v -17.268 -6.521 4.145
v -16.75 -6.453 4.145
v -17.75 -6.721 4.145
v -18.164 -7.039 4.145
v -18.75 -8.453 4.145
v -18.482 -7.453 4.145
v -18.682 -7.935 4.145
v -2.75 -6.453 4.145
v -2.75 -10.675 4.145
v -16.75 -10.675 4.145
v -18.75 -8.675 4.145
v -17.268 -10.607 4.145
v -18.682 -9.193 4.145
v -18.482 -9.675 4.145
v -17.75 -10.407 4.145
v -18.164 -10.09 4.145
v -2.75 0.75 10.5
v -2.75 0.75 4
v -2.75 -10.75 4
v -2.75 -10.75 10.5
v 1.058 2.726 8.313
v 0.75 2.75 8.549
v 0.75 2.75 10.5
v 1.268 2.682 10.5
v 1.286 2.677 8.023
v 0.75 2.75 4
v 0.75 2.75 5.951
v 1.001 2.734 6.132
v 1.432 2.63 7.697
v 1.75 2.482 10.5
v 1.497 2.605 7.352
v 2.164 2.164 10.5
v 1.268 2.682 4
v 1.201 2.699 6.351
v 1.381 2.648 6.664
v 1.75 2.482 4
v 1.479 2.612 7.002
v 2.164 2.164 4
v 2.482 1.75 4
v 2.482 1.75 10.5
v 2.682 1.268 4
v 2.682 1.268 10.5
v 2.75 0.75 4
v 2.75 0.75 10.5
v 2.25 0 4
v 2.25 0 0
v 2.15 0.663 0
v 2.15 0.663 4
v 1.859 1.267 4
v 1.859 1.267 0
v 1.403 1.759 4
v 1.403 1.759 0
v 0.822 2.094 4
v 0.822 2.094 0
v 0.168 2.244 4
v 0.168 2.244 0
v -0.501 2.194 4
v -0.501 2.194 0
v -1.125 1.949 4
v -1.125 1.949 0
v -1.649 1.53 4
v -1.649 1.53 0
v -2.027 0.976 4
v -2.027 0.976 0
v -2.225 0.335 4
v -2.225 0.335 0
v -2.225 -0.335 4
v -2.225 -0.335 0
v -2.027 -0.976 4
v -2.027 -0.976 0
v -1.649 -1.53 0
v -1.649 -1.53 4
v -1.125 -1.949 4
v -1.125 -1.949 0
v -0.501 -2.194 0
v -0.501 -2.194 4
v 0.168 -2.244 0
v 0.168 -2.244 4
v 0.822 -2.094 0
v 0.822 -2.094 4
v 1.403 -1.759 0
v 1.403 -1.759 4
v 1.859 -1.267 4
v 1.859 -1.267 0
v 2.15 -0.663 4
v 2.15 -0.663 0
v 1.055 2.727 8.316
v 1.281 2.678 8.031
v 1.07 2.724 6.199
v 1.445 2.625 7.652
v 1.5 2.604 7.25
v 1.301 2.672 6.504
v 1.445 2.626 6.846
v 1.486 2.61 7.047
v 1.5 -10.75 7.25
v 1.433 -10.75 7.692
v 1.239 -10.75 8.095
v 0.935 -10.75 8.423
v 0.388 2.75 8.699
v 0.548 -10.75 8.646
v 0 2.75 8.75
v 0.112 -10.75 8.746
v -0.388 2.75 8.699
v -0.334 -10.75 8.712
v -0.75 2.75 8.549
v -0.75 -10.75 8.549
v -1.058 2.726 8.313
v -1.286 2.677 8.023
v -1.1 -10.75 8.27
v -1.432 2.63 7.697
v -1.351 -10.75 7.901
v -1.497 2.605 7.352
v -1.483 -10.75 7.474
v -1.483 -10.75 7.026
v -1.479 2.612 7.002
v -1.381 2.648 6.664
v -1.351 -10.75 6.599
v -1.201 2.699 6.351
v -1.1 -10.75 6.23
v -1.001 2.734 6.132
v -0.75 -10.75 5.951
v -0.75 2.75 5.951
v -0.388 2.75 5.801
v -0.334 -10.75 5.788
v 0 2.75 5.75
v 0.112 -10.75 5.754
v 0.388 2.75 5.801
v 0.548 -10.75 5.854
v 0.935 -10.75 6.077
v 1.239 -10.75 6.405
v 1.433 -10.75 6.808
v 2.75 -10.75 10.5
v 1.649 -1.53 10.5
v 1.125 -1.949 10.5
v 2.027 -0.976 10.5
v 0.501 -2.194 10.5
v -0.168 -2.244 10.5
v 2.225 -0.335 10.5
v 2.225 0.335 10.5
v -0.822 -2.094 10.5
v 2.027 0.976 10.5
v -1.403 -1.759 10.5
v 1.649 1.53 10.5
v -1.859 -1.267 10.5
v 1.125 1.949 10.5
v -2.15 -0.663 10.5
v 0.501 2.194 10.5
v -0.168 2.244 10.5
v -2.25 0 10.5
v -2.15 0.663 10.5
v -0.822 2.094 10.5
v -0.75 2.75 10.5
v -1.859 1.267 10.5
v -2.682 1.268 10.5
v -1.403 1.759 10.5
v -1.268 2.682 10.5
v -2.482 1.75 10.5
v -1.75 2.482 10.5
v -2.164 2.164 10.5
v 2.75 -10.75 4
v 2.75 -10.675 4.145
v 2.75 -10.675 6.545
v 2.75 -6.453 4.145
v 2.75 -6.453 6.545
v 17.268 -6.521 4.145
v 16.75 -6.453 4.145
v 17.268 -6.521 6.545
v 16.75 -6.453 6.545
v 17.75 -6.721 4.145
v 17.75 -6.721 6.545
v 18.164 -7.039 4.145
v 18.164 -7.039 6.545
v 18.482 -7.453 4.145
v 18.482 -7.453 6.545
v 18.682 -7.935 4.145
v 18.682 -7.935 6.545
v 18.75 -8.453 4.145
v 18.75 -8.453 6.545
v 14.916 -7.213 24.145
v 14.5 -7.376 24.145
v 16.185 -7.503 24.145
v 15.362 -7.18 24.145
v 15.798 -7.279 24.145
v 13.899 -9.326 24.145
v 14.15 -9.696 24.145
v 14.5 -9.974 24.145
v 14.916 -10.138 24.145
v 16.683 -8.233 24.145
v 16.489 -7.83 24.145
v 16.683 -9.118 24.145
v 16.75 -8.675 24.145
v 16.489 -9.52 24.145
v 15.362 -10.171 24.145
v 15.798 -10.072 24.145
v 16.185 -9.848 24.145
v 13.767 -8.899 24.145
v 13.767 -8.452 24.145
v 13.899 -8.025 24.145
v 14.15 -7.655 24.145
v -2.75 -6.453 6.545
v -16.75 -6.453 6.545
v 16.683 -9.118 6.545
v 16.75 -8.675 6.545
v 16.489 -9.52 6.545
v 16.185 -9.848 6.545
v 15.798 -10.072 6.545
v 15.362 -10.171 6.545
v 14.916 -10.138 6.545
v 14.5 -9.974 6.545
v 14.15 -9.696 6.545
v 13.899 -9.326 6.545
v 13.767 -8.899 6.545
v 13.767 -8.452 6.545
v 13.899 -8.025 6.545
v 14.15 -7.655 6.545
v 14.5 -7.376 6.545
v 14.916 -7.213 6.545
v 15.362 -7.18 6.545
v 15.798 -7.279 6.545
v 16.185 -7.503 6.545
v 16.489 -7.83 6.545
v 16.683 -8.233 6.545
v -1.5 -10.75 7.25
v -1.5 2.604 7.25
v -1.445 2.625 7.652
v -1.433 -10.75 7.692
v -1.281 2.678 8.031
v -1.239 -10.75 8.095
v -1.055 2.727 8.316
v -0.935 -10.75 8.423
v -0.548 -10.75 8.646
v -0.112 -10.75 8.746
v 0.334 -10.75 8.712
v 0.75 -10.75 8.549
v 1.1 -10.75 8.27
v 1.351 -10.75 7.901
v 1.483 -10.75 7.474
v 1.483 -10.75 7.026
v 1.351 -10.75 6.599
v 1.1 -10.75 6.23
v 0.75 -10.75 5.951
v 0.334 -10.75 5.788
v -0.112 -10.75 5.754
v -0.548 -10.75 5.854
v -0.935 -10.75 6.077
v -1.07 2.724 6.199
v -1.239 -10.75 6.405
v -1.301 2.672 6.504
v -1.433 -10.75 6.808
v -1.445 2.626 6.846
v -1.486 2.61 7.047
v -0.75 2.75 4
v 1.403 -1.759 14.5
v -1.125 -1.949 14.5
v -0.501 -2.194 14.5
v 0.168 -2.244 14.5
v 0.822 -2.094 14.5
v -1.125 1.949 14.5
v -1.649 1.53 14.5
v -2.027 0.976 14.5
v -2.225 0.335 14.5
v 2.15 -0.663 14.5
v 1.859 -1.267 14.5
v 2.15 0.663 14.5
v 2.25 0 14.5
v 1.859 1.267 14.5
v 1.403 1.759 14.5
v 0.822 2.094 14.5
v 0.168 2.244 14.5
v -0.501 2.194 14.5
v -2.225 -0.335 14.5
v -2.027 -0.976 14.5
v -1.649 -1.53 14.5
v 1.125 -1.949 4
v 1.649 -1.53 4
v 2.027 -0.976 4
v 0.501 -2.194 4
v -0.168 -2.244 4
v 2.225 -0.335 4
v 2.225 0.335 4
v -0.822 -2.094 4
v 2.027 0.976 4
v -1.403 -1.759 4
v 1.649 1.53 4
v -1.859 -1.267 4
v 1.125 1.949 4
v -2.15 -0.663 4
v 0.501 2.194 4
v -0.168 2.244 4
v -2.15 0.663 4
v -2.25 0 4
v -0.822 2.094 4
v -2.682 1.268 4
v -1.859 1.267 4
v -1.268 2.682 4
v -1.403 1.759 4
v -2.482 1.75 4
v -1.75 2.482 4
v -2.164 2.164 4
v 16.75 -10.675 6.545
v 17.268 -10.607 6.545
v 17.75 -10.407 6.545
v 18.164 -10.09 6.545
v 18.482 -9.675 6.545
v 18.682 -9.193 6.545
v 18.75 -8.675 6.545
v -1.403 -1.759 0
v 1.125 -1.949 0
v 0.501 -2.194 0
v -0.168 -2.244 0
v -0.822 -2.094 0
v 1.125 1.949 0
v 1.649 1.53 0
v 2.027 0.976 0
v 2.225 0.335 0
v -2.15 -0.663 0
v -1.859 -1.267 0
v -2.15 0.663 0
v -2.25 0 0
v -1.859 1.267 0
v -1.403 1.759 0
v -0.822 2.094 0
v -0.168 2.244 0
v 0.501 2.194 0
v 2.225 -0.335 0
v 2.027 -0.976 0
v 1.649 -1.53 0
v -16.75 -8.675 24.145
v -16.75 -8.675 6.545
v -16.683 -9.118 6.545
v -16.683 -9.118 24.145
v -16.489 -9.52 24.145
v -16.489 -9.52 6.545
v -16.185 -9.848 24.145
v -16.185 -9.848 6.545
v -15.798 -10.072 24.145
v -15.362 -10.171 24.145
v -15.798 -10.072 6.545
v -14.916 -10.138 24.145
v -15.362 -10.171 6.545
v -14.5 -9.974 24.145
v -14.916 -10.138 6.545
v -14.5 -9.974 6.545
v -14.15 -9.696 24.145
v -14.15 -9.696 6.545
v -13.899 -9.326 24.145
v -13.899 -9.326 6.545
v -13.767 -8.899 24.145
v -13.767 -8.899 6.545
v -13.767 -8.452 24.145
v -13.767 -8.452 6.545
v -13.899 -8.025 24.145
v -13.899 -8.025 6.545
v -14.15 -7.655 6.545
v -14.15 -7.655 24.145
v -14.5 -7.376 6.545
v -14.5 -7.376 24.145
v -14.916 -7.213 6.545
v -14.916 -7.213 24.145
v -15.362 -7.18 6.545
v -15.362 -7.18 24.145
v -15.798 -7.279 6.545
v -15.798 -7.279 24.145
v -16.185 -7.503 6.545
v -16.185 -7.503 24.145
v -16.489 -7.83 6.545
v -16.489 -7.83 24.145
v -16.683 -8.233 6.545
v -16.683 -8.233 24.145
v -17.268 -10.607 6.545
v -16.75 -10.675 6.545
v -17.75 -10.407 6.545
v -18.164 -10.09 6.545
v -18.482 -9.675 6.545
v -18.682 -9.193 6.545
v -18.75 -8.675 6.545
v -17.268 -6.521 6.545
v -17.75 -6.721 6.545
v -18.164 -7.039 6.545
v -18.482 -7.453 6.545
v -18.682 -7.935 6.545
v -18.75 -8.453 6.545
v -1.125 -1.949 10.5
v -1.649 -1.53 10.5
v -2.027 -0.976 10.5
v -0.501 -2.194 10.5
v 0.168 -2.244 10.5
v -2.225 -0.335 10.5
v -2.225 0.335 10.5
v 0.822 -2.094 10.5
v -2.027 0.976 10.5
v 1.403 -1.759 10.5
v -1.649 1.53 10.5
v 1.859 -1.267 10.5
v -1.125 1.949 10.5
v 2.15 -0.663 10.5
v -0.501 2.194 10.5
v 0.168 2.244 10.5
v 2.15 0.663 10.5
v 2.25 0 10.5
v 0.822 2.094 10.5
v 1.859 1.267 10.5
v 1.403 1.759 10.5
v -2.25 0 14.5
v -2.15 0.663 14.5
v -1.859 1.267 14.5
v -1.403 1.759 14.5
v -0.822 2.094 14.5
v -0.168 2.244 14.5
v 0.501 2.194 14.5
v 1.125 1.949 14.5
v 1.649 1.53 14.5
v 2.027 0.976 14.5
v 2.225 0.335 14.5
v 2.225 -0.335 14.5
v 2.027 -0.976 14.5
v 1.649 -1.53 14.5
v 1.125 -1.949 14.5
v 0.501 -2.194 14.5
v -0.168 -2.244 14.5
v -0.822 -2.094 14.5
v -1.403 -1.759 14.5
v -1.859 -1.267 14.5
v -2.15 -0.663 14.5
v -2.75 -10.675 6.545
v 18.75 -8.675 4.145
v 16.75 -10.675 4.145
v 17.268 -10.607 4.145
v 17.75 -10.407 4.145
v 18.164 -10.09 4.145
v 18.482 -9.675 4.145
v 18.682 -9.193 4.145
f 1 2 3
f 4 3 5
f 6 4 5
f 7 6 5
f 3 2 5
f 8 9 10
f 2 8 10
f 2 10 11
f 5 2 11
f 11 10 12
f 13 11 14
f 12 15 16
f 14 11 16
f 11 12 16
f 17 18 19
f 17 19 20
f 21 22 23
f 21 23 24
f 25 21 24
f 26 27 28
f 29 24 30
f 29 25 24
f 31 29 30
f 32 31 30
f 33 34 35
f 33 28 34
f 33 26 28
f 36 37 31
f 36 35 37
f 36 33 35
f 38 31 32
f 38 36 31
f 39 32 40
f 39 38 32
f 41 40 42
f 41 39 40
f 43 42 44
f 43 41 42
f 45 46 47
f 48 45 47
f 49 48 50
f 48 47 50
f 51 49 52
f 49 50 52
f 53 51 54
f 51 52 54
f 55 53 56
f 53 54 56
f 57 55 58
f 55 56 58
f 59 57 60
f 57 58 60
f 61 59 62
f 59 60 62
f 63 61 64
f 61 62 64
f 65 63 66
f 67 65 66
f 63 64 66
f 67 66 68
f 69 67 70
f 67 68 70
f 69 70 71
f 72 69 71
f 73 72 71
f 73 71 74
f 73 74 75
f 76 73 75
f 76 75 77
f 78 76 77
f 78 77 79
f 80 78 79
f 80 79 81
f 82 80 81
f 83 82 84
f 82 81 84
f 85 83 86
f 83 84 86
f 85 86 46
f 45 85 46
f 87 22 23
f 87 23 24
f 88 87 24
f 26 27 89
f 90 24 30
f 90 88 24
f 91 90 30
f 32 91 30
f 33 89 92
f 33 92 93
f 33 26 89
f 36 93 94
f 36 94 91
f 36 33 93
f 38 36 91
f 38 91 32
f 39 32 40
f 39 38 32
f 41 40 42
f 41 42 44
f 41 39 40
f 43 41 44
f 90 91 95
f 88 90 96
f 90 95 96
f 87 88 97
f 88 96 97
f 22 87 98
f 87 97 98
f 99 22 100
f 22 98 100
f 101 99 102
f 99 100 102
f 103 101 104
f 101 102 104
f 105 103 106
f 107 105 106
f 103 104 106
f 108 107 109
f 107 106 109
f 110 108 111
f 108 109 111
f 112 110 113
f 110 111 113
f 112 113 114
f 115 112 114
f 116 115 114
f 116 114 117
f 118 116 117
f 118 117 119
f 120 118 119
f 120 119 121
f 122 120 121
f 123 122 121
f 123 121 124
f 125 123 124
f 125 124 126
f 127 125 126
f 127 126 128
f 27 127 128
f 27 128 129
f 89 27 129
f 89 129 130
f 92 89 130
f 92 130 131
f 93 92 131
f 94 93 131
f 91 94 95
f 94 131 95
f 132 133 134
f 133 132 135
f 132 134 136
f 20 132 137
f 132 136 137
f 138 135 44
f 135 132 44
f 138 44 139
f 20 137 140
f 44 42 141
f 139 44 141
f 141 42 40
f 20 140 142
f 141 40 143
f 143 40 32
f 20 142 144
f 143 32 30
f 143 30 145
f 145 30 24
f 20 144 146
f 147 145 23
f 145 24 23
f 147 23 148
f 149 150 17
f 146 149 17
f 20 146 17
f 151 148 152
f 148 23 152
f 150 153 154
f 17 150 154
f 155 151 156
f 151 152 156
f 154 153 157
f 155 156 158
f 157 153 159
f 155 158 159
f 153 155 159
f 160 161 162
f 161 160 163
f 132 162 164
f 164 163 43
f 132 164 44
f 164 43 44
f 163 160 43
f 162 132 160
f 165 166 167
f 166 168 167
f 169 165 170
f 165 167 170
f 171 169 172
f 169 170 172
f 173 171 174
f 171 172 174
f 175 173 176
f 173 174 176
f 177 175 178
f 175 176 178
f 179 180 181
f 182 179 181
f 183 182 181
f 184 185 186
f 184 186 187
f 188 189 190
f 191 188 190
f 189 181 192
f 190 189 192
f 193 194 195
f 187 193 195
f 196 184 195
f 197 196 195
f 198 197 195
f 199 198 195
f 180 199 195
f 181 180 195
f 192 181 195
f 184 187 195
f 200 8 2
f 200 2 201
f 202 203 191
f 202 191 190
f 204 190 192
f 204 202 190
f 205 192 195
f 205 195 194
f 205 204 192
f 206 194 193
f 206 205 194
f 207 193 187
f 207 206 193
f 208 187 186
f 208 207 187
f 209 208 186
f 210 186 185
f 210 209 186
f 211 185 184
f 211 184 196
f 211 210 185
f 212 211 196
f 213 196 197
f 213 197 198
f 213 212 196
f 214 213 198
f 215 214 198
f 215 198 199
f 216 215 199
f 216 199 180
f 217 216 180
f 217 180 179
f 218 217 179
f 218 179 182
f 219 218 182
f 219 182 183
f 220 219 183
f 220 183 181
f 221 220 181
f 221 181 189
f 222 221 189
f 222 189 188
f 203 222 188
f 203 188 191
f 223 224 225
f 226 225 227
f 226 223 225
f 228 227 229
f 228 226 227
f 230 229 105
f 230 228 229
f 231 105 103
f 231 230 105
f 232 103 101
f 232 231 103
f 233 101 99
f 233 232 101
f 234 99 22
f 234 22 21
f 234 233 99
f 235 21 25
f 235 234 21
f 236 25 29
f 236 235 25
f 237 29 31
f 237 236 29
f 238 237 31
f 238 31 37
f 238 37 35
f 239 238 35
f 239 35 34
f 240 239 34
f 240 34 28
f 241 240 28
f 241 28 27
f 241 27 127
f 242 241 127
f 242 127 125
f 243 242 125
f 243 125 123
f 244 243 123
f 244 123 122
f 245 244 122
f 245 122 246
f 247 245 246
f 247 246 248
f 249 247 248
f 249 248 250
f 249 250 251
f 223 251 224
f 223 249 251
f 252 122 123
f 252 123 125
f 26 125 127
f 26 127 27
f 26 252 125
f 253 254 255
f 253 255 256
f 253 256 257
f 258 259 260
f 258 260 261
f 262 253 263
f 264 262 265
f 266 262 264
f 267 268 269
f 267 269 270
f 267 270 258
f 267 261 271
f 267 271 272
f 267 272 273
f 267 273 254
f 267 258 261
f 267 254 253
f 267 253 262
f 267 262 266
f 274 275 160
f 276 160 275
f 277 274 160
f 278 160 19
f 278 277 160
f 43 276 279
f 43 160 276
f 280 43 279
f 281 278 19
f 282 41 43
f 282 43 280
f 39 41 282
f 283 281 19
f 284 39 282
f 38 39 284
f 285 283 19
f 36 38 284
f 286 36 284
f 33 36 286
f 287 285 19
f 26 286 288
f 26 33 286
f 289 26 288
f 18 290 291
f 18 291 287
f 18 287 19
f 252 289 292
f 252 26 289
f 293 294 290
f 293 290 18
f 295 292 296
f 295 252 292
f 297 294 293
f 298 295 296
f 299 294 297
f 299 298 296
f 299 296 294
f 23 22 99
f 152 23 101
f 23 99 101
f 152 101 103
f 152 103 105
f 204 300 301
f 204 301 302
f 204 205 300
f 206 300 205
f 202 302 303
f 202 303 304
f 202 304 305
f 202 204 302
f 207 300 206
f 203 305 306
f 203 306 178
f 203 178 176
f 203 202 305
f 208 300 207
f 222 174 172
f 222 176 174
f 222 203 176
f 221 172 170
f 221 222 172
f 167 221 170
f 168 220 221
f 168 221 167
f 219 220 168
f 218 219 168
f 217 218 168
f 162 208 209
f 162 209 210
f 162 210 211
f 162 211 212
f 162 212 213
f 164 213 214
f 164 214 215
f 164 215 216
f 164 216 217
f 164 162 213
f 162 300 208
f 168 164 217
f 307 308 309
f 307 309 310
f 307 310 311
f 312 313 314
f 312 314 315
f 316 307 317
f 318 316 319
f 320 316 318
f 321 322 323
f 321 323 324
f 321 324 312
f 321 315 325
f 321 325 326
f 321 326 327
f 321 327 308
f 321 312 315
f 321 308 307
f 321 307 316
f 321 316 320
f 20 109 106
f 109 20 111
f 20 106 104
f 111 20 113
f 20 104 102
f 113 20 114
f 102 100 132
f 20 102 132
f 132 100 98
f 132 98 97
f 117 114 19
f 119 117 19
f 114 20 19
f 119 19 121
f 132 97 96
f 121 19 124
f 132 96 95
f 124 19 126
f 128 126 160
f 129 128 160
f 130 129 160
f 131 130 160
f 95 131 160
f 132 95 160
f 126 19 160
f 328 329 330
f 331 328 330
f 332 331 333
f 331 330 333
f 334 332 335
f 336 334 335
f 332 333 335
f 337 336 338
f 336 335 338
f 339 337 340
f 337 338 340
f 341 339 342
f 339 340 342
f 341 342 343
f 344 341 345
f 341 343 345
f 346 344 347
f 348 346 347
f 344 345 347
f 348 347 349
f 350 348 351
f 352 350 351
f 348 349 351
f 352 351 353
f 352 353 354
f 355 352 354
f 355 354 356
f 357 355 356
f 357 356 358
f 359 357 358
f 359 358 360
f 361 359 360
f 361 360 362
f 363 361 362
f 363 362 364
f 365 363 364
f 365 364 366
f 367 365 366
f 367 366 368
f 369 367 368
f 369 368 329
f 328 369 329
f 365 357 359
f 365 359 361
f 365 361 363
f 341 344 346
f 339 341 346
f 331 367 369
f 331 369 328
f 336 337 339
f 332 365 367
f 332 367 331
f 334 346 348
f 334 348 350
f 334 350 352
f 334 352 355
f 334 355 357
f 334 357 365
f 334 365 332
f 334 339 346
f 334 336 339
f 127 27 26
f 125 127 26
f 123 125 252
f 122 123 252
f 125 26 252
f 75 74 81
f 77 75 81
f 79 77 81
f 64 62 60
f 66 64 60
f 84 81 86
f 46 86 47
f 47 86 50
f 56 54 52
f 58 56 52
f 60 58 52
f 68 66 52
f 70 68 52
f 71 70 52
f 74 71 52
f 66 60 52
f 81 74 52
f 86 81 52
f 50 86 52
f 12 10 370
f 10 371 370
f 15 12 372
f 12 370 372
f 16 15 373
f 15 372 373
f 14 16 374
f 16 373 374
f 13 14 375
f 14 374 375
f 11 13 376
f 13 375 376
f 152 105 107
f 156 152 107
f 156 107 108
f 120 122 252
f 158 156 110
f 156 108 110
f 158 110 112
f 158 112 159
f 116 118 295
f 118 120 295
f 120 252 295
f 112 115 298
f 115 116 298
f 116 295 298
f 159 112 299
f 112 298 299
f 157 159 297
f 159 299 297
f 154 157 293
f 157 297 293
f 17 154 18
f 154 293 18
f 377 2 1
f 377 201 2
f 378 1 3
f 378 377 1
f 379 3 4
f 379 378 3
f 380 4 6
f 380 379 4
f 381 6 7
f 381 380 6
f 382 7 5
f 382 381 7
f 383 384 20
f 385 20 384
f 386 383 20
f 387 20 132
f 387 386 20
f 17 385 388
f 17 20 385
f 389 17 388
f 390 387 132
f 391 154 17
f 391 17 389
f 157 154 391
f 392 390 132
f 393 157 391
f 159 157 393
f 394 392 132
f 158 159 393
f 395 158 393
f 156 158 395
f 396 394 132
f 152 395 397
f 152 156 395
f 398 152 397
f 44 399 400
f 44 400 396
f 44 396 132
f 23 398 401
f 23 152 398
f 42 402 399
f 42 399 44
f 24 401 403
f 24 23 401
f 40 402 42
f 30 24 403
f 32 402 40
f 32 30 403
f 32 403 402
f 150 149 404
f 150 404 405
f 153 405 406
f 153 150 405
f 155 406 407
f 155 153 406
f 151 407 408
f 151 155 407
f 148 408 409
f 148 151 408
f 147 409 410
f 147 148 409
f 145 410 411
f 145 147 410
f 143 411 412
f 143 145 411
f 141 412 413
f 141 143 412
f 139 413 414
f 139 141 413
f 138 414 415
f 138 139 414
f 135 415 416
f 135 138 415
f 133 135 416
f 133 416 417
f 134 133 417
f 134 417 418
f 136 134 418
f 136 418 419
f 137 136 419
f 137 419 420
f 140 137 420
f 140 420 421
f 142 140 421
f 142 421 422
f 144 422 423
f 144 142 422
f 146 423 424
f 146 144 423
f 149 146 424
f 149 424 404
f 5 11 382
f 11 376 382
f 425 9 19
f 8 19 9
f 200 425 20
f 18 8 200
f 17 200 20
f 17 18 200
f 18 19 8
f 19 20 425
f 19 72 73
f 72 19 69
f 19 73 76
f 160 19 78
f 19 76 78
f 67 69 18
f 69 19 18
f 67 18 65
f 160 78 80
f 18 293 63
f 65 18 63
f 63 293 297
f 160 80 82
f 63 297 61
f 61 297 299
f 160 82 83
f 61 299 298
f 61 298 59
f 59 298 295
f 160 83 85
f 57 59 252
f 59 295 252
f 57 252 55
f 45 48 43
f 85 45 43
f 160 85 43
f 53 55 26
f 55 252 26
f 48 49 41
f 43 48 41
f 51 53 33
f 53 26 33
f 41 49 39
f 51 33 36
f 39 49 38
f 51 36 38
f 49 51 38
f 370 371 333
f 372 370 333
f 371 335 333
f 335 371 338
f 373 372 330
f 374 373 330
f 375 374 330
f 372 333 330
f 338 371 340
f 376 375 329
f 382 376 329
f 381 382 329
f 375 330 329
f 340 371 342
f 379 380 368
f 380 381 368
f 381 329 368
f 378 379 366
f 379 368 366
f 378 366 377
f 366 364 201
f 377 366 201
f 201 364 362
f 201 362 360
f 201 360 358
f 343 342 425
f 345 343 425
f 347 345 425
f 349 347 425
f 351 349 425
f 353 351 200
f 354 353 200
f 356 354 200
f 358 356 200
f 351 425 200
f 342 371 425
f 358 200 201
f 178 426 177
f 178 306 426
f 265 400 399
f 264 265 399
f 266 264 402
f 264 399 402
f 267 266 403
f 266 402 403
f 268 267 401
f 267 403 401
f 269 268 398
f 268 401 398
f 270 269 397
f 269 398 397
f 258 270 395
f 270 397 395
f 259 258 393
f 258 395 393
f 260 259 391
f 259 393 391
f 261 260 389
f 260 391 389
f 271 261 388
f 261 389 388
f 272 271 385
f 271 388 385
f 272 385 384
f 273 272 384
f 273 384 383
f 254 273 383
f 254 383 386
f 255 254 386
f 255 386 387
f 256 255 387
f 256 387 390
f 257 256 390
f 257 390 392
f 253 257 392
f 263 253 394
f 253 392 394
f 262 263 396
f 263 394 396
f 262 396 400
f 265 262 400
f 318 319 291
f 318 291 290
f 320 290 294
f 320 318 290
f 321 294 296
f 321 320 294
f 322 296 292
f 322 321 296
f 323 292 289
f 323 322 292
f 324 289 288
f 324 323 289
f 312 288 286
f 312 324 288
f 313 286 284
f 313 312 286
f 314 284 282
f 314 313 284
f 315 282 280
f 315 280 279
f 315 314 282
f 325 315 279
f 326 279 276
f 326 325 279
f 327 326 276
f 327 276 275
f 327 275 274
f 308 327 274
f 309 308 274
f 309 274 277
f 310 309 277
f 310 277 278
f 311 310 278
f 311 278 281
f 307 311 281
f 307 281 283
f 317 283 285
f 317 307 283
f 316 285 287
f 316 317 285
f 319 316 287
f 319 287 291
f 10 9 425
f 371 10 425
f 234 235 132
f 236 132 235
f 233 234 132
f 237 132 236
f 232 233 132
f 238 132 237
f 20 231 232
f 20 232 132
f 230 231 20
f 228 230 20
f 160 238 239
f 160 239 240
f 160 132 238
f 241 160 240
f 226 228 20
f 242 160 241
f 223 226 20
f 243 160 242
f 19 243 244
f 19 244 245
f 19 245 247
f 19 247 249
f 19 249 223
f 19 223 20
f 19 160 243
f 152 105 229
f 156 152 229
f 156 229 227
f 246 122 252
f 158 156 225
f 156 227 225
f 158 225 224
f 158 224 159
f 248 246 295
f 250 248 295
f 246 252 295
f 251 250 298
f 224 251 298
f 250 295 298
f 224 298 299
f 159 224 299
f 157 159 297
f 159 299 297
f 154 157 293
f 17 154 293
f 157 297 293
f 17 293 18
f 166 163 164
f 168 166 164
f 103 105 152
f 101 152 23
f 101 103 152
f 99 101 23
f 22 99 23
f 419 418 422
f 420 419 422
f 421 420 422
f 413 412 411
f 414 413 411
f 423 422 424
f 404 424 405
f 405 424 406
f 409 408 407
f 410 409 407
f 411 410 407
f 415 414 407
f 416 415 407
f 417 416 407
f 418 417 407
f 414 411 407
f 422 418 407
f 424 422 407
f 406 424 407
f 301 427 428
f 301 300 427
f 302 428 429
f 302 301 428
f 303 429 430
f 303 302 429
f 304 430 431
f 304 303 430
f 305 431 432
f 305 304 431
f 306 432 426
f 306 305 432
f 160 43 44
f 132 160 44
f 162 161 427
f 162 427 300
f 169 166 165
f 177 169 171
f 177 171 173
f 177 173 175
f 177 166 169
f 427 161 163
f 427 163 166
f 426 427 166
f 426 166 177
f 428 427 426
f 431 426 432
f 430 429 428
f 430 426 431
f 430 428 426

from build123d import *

# Parameters (mm, degrees)
F0_R        = 2.25
F1_DEPTH    = 4
F2_W        = 5.5
F2_H        = 5.5
F3_DEPTH    = 6.5
F4_R        = 2.25
F5_DEPTH    = 4
F6_DEPTH    = 8
F7_R        = 1.5
F8_DEPTH    = 13.5
F9_T1_DEPTH = 16.5
F11_W       = 4.2225685902
F11_H       = 2.4003293365
F12_DEPTH   = 16
F13_R       = 2
F14_R       = 1.5
F15_DEPTH   = 20


# Not quite as in the source:
# - a fillet or chamfer that OpenCascade refuses, or shapes differently, is made with other operations: its cross-section is extruded or revolved along the edge and cut away or added


with BuildPart() as f1:
    # F0 (on Top) → F1 (new body)
    with BuildSketch(Plane.XY):
        Circle(F0_R)
    extrude(amount=F1_DEPTH)

    # F2 (on face) → F3 (join)
    with BuildSketch(Plane.XY.offset(4)):
        Rectangle(F2_W, F2_H)
    extrude(amount=F3_DEPTH)

    # F4 (on face) → F5 (join)
    with BuildSketch(Plane.XY.offset(10.5)):
        Circle(F4_R)
    extrude(amount=F5_DEPTH)

    # F6 (add): a face of the model
    f6_faces = [f1.faces().sort_by_distance(p)[0] for p in [
        (0, -2.75, 7.25),
    ]]
    extrude(f6_faces, amount=F6_DEPTH)

    # F7 (on face) → F8 (cut, through all)
    with BuildSketch(Plane.XZ.offset(10.75)):
        with Locations((0, 7.25)):
            Circle(F7_R)
    extrude(amount=-F8_DEPTH, mode=Mode.SUBTRACT)

    # F9: fillet of radius 2 on 2 edges, made by hand

    # F9_s2 → F9_t1 (cut)
    with BuildSketch(Plane.XY.offset(-1)):
        with BuildLine():
            ThreePointArc((-0.75, 2.75), (-2.1642135624, 2.1642135624), (-2.75, 0.75))
            Line((-2.75, 0.75), (-2.75, 2.75))
            Line((-2.75, 2.75), (-0.75, 2.75))
        make_face()
        with BuildLine():
            ThreePointArc((0.75, 2.75), (2.1642135624, 2.1642135624), (2.75, 0.75))
            Line((2.75, 0.75), (2.75, 2.75))
            Line((2.75, 2.75), (0.75, 2.75))
        make_face()
    extrude(amount=F9_T1_DEPTH, mode=Mode.SUBTRACT)

    # F11 (on face) → F12 (join)
    with BuildSketch(Plane.YZ.offset(2.75)):
        with Locations((-8.5641460028, 5.3448951803)):
            Rectangle(F11_W, F11_H)
    extrude(amount=F12_DEPTH)

    # F13
    f13_edges = [f1.edges().sort_by_distance(p)[0] for p in [
        (18.75, -10.67543, 5.344895),
        (18.75, -6.452862, 5.344895),
    ]]
    fillet(f13_edges, radius=F13_R)

    # F14 (on face) → F15 (join)
    with BuildSketch(Plane(origin=(0, 0, 4.1447305121), x_dir=(1, 0, 0), z_dir=(0, 0, -1))):
        with Locations((15.25, 8.6754302979)):
            Circle(F14_R)
    extrude(amount=-F15_DEPTH)


with BuildPart() as f16_1:
    # F16: instance of F1
    add(f1.part.mirror(Plane.YZ))


solid = Compound([f1.part, f16_1.part])
